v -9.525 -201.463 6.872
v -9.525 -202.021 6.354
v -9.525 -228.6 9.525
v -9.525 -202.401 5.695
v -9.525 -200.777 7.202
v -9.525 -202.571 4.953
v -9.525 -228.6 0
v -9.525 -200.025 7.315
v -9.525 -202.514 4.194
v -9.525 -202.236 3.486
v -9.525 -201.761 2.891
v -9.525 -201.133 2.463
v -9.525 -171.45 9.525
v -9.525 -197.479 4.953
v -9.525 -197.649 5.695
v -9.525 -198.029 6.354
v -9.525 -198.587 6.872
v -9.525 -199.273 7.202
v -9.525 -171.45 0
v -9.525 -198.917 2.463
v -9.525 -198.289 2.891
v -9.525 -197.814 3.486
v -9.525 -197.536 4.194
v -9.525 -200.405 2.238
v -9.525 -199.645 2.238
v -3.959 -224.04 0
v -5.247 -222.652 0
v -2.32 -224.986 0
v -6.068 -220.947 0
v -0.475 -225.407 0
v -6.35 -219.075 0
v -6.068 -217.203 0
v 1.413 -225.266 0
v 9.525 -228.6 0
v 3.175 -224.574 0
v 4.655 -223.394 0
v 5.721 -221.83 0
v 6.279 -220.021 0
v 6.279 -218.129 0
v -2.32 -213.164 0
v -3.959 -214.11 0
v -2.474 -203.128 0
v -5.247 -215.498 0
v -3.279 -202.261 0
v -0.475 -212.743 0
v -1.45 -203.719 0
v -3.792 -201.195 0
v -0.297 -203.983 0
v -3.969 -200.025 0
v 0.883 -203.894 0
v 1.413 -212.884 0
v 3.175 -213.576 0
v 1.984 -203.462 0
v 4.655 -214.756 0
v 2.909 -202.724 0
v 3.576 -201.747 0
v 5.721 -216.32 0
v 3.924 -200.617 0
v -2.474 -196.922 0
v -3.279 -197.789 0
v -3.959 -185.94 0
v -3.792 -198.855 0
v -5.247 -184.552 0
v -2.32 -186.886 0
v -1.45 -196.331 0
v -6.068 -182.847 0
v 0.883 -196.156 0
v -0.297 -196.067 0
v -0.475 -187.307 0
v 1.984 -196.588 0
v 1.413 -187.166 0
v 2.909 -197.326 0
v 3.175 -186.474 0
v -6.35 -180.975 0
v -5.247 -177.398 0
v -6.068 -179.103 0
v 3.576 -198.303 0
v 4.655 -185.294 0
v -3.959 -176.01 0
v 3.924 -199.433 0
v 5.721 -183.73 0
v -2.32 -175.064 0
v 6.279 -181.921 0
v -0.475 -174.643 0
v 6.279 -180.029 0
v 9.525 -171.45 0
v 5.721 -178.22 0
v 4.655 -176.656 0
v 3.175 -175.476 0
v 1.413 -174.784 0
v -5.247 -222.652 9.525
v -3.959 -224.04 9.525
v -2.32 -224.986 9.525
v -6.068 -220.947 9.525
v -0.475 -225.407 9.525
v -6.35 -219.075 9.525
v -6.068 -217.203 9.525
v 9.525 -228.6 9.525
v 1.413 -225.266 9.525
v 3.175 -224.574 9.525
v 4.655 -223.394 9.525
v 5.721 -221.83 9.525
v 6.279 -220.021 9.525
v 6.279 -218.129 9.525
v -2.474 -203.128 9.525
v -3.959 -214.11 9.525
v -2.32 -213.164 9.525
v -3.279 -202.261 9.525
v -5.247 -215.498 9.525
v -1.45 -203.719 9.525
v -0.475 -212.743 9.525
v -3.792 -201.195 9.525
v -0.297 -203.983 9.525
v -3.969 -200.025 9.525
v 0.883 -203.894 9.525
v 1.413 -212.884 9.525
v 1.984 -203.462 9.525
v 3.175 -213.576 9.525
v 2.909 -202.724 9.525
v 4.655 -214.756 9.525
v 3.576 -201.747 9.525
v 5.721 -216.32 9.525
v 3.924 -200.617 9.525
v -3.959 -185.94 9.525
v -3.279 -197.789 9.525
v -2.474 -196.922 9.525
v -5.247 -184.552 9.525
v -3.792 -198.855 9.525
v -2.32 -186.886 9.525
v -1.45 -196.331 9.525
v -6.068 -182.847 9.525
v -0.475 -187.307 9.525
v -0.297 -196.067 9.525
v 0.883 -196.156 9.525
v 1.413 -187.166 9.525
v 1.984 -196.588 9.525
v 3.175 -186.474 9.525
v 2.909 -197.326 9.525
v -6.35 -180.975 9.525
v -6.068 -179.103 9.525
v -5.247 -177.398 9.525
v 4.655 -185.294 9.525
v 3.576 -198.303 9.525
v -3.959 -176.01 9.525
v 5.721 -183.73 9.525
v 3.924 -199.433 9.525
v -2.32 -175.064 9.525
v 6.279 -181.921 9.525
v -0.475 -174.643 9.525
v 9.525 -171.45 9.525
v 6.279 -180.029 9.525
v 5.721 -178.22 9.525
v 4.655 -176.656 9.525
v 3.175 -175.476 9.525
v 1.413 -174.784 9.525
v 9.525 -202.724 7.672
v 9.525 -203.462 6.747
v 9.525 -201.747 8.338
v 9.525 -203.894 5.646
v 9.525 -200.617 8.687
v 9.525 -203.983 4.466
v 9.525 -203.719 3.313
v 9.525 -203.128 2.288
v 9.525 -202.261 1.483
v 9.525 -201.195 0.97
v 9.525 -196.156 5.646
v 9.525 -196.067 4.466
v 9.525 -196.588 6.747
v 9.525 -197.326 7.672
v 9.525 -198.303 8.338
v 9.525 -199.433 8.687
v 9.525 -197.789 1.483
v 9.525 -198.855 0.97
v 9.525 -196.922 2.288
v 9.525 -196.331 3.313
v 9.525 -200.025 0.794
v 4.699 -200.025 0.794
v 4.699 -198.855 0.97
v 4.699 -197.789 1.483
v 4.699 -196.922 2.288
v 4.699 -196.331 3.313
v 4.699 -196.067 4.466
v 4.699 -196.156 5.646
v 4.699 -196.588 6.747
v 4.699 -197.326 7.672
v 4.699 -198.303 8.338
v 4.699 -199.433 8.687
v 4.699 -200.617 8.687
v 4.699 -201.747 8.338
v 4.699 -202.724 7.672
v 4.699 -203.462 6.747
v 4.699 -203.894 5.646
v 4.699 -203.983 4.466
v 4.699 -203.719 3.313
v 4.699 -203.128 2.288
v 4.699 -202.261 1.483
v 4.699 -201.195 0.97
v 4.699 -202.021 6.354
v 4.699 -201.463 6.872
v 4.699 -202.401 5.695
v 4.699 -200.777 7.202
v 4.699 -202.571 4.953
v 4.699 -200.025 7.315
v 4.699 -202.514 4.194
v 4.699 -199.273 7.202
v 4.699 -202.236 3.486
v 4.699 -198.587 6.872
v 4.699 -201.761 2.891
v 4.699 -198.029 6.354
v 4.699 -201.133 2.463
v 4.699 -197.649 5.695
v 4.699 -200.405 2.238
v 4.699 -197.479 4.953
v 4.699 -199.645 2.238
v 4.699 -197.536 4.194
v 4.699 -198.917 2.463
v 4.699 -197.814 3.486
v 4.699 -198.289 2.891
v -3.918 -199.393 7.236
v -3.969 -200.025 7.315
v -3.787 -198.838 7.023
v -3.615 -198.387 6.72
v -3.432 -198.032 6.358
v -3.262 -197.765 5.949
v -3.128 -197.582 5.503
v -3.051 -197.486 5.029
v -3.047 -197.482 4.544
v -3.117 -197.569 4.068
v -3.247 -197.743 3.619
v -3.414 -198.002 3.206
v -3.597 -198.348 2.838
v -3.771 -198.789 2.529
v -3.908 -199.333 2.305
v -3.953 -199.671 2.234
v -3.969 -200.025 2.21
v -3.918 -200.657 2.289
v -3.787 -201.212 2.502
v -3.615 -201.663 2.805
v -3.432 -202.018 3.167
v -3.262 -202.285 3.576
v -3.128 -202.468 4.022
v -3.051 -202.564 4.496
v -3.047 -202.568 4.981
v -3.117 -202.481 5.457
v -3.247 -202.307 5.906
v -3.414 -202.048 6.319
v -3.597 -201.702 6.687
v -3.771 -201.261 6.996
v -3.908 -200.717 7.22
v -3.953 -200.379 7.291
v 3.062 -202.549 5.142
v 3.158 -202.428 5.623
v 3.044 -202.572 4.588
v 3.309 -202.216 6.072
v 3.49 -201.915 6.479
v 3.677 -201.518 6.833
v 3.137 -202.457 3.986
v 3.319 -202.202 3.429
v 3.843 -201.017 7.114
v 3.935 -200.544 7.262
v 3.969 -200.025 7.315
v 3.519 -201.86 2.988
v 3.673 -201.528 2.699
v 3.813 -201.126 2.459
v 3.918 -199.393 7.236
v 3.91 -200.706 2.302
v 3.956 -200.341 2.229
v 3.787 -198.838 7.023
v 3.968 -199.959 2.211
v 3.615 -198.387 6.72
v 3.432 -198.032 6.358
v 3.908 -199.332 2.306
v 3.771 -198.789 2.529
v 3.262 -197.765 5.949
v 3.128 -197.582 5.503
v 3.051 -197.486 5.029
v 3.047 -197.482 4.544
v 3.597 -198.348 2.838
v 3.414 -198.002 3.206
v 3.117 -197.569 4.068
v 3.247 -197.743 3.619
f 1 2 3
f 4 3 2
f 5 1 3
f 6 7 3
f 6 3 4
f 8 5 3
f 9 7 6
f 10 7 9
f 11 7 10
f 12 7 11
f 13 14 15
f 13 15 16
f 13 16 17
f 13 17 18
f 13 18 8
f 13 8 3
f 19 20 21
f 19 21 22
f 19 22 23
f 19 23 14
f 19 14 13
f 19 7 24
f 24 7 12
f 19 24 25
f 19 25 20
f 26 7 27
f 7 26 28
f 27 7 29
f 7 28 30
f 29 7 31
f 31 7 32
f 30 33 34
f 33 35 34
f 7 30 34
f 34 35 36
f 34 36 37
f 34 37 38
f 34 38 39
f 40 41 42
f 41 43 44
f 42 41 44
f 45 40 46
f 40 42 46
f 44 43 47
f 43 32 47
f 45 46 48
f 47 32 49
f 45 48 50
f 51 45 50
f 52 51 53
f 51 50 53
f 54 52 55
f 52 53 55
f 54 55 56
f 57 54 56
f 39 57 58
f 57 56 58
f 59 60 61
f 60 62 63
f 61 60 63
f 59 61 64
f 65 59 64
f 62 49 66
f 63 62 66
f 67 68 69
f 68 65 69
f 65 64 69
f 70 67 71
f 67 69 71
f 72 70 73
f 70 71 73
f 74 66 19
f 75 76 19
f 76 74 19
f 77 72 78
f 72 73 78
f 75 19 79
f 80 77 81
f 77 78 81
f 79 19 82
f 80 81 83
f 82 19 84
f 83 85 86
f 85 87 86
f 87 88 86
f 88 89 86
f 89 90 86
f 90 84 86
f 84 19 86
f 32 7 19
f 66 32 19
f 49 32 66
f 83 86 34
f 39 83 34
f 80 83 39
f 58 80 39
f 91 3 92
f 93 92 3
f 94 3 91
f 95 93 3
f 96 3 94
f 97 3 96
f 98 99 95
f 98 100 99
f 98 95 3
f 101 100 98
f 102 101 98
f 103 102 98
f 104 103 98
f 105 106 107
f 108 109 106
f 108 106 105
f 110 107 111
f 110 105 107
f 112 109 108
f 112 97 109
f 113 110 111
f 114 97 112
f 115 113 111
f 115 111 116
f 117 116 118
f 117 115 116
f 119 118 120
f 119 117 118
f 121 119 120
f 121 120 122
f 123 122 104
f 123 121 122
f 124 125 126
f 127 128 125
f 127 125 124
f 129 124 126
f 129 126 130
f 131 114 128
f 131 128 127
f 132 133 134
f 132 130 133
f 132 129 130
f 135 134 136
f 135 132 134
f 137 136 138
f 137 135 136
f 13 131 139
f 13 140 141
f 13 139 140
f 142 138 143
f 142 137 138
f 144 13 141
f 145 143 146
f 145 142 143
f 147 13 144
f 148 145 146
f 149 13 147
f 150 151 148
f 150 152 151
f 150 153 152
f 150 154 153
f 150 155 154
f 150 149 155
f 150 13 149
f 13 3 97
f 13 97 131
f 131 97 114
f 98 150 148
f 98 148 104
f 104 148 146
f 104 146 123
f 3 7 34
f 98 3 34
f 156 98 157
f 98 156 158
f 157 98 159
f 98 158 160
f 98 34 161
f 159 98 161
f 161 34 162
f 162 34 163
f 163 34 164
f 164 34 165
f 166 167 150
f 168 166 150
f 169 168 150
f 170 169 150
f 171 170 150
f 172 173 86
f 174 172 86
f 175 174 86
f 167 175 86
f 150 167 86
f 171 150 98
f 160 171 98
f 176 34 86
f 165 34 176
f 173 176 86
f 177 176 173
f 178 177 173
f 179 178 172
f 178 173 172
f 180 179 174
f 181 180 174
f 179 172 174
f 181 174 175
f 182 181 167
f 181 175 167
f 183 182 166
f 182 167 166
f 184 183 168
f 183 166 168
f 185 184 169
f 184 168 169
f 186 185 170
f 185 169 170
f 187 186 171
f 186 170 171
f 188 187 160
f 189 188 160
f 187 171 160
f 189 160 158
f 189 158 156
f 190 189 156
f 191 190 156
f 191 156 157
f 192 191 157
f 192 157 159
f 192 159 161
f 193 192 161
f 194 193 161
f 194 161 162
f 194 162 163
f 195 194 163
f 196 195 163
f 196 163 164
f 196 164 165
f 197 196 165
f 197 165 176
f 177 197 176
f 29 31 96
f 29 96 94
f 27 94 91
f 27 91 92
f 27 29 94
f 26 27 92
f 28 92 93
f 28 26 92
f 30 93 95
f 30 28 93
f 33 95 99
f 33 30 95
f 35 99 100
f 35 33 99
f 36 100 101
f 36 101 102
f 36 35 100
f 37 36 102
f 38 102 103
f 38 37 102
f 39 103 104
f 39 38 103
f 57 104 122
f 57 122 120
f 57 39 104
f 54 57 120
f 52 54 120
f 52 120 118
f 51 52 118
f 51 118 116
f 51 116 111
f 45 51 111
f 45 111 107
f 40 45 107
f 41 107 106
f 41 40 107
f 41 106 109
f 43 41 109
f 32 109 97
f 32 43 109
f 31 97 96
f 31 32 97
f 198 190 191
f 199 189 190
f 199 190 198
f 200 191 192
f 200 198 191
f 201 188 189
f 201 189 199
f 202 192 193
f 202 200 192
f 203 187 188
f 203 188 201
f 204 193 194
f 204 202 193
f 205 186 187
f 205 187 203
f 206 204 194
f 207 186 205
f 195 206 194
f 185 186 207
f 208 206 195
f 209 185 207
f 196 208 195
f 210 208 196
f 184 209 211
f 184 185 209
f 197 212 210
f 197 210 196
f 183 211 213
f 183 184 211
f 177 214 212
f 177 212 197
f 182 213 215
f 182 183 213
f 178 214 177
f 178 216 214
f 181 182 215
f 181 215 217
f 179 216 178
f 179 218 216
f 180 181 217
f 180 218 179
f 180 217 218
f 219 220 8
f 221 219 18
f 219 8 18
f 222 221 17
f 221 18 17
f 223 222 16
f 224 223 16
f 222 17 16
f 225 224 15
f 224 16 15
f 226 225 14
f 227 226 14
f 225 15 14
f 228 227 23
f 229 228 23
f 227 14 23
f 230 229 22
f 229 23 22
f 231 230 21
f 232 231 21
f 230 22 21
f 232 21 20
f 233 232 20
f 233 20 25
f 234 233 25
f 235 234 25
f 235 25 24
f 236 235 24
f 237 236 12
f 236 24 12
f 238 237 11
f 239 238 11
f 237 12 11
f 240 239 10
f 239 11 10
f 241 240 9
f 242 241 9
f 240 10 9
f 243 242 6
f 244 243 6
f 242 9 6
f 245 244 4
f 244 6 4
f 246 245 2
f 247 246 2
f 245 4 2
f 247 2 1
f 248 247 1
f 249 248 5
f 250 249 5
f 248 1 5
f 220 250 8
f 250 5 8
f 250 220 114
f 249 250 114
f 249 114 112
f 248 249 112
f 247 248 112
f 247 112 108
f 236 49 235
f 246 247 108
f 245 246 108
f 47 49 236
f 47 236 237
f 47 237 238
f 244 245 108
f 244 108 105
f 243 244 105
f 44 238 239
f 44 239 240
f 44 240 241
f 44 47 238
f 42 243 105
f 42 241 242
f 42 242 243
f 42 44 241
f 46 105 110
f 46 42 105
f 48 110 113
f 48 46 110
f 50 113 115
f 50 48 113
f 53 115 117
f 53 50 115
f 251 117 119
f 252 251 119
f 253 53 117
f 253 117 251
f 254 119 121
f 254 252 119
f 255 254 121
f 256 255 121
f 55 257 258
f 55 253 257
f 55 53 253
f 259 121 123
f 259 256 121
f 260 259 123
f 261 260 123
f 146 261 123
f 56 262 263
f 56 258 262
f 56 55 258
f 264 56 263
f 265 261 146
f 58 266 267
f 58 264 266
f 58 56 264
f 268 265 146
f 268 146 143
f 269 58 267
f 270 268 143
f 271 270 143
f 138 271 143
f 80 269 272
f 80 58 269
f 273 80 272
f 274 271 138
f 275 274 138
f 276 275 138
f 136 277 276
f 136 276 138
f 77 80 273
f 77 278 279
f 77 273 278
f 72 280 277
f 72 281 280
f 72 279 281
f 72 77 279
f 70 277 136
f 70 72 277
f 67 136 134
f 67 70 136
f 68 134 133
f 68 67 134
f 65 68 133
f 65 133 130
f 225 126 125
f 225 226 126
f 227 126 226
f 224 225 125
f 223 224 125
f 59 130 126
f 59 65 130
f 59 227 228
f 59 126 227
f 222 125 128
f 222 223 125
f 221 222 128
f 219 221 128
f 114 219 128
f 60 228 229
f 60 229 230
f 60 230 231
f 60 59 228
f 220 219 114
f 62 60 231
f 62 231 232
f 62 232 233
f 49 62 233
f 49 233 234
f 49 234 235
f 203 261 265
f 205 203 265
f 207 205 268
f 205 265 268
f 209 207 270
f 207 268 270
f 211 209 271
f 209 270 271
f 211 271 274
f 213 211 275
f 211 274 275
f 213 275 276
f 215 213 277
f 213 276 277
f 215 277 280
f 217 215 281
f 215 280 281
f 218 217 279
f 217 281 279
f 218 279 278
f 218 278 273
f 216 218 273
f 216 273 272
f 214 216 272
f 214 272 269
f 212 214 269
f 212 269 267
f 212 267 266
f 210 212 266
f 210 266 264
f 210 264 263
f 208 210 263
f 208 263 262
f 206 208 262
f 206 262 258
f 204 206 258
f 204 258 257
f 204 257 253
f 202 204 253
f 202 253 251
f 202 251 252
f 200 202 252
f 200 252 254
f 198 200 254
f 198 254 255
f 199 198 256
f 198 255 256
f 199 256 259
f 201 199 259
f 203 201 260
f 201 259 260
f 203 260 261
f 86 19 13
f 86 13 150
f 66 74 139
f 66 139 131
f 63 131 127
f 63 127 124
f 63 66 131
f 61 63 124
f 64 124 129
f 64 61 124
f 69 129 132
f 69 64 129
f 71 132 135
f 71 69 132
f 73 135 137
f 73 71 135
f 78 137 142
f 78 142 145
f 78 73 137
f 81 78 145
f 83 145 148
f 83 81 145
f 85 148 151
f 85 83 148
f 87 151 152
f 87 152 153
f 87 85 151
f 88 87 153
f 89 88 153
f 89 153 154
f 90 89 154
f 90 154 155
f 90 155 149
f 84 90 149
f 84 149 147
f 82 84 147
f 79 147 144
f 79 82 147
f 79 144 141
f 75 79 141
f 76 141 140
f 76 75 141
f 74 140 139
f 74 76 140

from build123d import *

# Parameters (mm, degrees)
SKETCH1_W                                       = 19.05
SKETCH1_H                                       = 57.15
SKETCH1_R                                       = 3.96875
SKETCH1_R_2                                     = 6.35
BOSS_EXTRUDE2_DEPTH                             = 9.525
CBORE_FOR_10_SOCKET_HEAD_CAP_SCREW2_D           = 5.1054
CBORE_FOR_10_SOCKET_HEAD_CAP_SCREW2_DEPTH       = 19.05
CBORE_FOR_10_SOCKET_HEAD_CAP_SCREW2_CBORE_D     = 7.9375
CBORE_FOR_10_SOCKET_HEAD_CAP_SCREW2_CBORE_DEPTH = 4.826
CBORE_FOR_10_SOCKET_HEAD_CAP_SCREW2_TIP         = 1.533816902


with BuildPart() as part:
    # Sketch1 → Boss-Extrude2 (new body)
    with BuildSketch(Plane.XY):
        with Locations((0, -200.025)):
            Rectangle(SKETCH1_W, SKETCH1_H)
        with Locations(Location((0, -200.025, 0), (0, 0, 180))):
            Circle(SKETCH1_R, mode=Mode.SUBTRACT)
        with Locations(Location((0, -180.975, 0), (0, 0, 180))):
            Circle(SKETCH1_R_2, mode=Mode.SUBTRACT)
        with Locations(Location((0, -219.075, 0), (0, 0, 180))):
            Circle(SKETCH1_R_2, mode=Mode.SUBTRACT)
    extrude(amount=BOSS_EXTRUDE2_DEPTH)

    # CBORE for #10 Socket Head Cap Screw2
    with Locations(Plane(origin=(9.525, 0, 0), x_dir=(0, 0, -1), z_dir=(1, 0, 0))):
        with Locations((-4.7625, -200.025)):
            CounterBoreHole(CBORE_FOR_10_SOCKET_HEAD_CAP_SCREW2_D / 2, CBORE_FOR_10_SOCKET_HEAD_CAP_SCREW2_CBORE_D / 2, CBORE_FOR_10_SOCKET_HEAD_CAP_SCREW2_CBORE_DEPTH, depth=CBORE_FOR_10_SOCKET_HEAD_CAP_SCREW2_DEPTH)
            with Locations((0, 0, -(CBORE_FOR_10_SOCKET_HEAD_CAP_SCREW2_DEPTH + CBORE_FOR_10_SOCKET_HEAD_CAP_SCREW2_TIP / 2))):  # 118° drill point
                Cone(0, CBORE_FOR_10_SOCKET_HEAD_CAP_SCREW2_D / 2, CBORE_FOR_10_SOCKET_HEAD_CAP_SCREW2_TIP, mode=Mode.SUBTRACT)


solid = part.part
